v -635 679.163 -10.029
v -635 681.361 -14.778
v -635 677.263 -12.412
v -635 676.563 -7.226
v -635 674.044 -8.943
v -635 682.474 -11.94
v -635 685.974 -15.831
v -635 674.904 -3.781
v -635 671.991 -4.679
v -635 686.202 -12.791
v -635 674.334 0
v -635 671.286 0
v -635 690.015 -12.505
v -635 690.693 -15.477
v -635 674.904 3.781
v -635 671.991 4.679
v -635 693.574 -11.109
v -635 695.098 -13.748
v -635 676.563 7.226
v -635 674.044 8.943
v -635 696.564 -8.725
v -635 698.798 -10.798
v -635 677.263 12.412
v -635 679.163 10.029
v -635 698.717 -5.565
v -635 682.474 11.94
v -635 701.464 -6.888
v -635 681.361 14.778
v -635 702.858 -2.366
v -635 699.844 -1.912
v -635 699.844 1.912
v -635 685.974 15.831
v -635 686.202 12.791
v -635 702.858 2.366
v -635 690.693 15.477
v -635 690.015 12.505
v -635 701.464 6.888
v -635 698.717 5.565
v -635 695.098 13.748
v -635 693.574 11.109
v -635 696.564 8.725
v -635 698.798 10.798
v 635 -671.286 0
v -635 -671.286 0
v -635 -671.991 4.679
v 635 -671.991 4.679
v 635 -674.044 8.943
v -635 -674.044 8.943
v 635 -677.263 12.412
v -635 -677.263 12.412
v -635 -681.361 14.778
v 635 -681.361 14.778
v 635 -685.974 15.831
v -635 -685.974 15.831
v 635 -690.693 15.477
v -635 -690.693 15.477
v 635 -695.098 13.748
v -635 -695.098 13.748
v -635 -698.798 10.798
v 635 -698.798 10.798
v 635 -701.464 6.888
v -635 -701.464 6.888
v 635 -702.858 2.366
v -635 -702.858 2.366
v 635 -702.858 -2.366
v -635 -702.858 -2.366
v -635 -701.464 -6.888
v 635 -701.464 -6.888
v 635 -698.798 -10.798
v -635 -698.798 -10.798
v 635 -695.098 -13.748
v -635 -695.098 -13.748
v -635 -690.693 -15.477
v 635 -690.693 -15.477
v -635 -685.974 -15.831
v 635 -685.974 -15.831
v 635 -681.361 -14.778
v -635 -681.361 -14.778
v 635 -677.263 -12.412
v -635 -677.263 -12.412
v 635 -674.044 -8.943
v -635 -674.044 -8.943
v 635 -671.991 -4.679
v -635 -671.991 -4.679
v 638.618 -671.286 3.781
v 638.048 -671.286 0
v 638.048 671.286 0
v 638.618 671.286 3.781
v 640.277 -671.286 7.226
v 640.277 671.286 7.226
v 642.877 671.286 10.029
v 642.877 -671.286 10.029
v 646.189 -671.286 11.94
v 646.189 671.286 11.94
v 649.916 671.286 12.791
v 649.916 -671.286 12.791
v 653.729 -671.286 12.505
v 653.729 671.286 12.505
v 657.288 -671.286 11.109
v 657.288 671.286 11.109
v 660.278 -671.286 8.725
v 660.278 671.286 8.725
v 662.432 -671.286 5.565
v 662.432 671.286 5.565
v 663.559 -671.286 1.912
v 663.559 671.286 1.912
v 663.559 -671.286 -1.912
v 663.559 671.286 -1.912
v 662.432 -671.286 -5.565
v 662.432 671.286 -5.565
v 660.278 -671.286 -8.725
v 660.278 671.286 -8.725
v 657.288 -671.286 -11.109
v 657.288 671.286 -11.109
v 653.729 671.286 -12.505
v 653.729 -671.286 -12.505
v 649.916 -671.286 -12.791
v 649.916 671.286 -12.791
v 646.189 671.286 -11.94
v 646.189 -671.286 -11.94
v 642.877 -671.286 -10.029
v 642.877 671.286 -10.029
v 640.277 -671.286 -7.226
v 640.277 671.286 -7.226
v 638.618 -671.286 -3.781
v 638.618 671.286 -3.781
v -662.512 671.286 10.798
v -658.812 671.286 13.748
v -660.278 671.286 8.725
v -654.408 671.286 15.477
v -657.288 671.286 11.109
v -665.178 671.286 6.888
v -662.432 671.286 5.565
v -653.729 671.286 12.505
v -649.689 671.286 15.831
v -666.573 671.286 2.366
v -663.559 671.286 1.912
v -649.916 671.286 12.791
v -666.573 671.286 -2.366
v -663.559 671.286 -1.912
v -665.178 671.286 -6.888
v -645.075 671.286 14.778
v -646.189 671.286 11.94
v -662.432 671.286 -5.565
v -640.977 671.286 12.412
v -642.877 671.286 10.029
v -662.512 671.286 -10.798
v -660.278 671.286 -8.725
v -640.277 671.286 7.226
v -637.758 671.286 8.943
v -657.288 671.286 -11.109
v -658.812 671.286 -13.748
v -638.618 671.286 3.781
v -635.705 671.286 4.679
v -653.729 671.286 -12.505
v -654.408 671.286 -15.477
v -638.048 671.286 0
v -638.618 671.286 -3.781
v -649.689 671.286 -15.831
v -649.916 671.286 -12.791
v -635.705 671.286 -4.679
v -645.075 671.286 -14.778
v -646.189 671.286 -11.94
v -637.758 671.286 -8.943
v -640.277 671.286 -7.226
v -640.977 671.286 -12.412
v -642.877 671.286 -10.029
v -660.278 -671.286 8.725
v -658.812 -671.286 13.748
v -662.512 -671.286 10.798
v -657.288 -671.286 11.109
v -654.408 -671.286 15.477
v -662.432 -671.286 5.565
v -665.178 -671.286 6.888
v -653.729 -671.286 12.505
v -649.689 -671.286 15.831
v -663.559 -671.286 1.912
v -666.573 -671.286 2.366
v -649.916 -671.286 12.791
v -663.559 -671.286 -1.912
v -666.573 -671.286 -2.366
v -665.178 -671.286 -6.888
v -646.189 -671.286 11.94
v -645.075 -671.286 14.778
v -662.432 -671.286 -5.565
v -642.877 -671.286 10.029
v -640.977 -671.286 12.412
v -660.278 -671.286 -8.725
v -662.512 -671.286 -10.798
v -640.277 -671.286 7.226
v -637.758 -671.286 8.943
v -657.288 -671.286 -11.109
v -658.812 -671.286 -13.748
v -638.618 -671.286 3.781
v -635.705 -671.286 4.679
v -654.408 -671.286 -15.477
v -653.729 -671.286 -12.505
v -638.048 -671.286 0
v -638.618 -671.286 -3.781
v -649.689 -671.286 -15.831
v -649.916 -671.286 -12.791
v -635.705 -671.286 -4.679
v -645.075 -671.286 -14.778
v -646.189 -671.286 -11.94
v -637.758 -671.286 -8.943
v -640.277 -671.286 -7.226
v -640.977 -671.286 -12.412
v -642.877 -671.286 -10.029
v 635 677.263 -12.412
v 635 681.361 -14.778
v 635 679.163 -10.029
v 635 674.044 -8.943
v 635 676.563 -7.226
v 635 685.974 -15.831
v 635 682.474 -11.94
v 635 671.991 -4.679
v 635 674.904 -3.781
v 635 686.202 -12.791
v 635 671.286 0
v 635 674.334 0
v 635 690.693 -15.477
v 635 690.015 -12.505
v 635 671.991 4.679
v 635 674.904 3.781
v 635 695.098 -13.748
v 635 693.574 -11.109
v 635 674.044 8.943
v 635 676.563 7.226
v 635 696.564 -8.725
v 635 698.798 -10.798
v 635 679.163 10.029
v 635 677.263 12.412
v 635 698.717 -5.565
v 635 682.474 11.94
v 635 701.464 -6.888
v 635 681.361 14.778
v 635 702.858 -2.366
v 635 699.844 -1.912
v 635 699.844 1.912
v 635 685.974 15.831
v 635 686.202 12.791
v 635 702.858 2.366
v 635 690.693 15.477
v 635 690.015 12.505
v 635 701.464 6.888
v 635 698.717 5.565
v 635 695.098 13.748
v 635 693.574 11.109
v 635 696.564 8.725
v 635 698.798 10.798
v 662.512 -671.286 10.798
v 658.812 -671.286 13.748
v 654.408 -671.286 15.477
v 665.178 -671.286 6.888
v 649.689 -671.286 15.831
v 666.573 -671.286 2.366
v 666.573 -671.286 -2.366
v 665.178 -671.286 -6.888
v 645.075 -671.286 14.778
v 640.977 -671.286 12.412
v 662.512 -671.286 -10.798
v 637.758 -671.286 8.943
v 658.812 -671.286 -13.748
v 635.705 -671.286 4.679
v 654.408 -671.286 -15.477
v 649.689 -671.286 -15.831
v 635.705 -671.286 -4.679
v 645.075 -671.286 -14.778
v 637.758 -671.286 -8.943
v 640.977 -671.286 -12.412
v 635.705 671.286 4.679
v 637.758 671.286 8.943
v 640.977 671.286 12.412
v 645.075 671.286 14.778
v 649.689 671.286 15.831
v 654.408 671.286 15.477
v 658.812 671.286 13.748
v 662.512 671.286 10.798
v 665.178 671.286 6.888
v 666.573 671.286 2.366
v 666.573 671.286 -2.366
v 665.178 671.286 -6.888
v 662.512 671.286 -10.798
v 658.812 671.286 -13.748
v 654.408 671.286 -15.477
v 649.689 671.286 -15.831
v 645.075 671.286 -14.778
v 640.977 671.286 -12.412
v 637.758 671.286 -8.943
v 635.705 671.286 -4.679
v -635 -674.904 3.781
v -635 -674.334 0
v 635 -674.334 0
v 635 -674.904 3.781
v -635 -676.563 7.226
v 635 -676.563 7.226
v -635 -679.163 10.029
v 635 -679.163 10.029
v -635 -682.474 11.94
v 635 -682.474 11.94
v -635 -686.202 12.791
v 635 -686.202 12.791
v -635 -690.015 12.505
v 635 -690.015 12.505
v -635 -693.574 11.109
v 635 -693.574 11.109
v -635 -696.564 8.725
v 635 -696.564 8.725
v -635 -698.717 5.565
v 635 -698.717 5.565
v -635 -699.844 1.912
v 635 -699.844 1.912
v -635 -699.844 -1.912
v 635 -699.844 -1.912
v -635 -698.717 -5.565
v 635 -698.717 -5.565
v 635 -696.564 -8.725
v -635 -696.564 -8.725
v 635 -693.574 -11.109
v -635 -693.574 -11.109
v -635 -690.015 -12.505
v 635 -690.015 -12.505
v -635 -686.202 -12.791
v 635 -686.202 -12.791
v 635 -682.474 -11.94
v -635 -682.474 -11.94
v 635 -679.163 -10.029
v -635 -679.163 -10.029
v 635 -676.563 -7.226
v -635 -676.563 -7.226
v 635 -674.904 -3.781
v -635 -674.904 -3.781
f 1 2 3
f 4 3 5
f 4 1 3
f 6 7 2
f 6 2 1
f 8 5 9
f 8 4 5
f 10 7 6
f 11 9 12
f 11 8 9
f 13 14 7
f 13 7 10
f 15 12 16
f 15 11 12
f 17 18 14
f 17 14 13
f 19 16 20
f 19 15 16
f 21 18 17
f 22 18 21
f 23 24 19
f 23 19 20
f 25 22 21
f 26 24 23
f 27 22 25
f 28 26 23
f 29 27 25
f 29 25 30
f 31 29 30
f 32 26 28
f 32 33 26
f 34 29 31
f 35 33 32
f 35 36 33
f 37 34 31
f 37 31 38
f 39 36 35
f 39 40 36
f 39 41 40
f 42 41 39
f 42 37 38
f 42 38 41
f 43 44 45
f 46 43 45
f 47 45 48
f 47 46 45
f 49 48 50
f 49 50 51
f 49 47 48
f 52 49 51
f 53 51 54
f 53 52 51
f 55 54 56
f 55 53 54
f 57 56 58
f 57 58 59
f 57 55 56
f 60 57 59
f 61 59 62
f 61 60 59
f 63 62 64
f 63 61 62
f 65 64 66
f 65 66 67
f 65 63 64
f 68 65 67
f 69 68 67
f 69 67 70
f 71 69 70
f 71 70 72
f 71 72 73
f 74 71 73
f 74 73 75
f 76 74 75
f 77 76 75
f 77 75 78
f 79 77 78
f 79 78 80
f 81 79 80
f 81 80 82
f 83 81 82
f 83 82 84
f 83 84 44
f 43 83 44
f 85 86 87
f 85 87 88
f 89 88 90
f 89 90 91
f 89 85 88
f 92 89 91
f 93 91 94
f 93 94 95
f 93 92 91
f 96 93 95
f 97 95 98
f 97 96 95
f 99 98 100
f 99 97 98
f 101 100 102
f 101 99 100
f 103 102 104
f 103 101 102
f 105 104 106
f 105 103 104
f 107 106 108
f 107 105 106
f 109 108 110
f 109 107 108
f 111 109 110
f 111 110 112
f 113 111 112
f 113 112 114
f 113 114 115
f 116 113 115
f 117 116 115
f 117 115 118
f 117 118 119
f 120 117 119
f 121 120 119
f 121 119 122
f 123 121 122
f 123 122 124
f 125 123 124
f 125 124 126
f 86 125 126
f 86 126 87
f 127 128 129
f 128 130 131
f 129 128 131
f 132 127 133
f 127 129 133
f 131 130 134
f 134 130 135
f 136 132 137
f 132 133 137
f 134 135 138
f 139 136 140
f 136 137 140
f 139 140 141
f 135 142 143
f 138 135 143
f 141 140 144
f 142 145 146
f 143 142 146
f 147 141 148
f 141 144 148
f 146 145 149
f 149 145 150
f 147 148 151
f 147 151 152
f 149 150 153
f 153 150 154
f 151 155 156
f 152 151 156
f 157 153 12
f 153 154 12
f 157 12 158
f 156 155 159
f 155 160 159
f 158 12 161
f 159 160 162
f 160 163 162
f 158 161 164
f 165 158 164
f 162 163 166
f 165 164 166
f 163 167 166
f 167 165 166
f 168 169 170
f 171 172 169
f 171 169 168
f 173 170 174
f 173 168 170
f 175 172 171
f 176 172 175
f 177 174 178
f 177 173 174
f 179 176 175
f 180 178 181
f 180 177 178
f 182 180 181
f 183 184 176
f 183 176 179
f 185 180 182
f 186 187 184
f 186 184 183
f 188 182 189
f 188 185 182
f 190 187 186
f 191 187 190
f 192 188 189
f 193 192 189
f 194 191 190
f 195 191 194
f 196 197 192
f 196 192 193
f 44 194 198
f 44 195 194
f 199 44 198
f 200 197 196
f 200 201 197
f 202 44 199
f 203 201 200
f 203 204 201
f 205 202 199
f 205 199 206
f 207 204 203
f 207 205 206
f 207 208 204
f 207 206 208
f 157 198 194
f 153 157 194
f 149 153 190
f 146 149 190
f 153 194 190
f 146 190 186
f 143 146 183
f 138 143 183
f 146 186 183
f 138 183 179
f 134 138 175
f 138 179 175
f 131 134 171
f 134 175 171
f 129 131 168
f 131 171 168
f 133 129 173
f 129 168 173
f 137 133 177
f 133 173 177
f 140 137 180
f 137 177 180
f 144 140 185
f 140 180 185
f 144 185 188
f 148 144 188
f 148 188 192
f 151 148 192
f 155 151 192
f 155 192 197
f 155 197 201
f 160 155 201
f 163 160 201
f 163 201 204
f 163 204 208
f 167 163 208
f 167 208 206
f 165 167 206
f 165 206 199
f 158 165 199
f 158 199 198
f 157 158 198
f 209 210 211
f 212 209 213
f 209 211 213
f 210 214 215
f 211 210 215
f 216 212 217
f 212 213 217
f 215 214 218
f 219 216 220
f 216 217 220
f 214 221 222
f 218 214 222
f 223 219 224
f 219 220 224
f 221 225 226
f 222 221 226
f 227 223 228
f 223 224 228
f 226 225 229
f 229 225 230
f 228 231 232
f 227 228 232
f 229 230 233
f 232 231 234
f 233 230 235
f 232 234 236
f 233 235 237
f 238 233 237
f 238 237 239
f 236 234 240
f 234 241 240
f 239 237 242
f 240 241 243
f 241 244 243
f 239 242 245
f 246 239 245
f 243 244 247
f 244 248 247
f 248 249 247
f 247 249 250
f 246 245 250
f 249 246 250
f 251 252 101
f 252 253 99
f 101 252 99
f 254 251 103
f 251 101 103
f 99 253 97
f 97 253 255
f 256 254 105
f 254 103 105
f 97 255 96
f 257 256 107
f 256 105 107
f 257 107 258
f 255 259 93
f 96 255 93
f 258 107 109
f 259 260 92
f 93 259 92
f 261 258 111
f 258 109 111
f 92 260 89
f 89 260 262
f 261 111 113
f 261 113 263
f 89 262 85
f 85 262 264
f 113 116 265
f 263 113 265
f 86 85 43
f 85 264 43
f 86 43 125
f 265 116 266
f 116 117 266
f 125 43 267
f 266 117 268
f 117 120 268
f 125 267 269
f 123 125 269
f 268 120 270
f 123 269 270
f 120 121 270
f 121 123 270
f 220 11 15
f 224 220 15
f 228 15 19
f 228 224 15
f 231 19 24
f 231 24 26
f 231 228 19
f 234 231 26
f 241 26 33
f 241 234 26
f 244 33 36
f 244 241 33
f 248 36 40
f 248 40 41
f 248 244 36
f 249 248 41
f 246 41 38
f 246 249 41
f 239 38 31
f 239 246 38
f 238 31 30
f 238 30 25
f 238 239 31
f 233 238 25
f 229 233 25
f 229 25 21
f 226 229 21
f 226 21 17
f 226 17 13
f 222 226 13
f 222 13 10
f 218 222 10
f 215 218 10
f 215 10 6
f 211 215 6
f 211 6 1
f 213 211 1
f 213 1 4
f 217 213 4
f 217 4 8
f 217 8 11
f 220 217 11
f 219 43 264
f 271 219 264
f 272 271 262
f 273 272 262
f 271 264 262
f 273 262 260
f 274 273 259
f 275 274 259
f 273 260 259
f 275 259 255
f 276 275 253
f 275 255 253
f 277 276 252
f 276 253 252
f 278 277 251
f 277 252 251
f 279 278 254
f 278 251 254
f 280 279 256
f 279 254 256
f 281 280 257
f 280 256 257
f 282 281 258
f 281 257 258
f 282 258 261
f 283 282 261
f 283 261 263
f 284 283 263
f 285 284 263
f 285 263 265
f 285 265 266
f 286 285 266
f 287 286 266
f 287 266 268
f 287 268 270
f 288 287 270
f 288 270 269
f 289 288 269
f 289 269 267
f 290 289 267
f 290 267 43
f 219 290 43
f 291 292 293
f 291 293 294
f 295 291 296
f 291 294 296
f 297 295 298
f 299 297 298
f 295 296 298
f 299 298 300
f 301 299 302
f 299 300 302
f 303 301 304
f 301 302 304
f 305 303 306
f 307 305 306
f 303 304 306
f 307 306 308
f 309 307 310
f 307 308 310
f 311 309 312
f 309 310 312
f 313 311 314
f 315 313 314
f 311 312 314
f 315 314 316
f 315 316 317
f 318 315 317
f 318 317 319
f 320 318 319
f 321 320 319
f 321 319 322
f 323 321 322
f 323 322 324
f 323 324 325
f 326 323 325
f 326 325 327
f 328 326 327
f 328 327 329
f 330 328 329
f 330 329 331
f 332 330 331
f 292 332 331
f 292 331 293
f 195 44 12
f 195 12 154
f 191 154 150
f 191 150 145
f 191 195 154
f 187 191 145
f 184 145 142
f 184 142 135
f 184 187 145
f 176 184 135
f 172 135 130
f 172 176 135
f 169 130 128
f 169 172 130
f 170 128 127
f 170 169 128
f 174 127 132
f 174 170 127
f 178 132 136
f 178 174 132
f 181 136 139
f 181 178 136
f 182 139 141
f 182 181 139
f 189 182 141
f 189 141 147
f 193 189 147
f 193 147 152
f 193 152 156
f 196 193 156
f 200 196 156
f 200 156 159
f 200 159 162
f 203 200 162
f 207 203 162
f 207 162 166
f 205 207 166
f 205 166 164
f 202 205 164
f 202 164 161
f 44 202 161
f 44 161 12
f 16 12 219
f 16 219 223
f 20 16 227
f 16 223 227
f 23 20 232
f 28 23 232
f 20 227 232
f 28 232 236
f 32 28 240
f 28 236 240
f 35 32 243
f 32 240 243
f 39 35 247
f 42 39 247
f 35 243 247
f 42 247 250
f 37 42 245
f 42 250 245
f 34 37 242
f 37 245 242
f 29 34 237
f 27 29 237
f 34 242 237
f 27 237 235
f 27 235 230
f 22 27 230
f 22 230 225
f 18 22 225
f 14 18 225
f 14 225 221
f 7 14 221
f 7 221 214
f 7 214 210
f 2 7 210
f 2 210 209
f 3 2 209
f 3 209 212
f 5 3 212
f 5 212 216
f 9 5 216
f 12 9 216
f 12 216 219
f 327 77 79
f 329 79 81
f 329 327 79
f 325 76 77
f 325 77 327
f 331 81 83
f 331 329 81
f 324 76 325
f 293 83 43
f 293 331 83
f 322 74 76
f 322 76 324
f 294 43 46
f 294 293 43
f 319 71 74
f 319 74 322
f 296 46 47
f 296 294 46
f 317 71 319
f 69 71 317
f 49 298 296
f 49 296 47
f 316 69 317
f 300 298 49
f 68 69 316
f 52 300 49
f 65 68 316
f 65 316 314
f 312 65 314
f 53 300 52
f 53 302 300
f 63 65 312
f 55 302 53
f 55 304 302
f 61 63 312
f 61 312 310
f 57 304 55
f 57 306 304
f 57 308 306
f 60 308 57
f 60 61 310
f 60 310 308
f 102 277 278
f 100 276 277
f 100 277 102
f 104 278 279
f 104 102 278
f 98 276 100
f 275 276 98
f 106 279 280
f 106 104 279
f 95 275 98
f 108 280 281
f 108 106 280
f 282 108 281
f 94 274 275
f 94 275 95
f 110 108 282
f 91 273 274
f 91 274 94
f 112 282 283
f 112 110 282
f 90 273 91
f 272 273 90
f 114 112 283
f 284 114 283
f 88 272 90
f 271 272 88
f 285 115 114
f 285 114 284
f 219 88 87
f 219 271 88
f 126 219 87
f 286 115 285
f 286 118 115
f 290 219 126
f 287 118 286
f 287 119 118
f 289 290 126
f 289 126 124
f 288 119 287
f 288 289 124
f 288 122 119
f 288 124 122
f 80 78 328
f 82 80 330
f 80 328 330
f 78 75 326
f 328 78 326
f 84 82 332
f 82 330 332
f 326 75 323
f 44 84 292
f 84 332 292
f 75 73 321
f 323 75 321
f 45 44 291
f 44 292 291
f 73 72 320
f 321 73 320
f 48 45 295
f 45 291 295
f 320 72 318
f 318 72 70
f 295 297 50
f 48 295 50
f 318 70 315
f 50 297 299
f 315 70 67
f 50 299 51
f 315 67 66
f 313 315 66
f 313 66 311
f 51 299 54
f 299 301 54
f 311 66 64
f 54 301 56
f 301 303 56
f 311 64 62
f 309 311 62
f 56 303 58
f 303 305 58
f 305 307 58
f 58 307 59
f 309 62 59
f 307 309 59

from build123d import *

# Parameters (mm, degrees)
F2_R   = 15.875
F2_R_2 = 12.827
F6_R   = 15.875
F6_R_2 = 12.827


with BuildPart() as f3:
    # F3: sweep along a path in F0
    with BuildLine(Plane.XY) as f3_path:
        Line((-635, 671.2856875498), (-635, -671.2856875498))
    # F2 (on plane+point) → F3 (sweep)
    with BuildSketch(Plane.XZ.offset(671.2856875498)):
        with Locations((-650.875, 0)):
            Circle(F2_R)
        with Locations((-650.875, 0)):
            Circle(F2_R_2, mode=Mode.SUBTRACT)
    sweep(path=f3_path.line)


with BuildPart() as f4_1:
    # F4: instance of F3
    add(f3.part.mirror(Plane.YZ))


with BuildPart() as f7:
    # F7: sweep along a path in F0
    with BuildLine(Plane.XY) as f7_path:
        Line((-635, -671.2856875498), (635, -671.2856875498))
    # F6 (on plane+point) → F7 (sweep)
    with BuildSketch(Plane.YZ.offset(-635)):
        with Locations((-687.1606875498, 0)):
            Circle(F6_R)
        with Locations((-687.1606875498, 0)):
            Circle(F6_R_2, mode=Mode.SUBTRACT)
    sweep(path=f7_path.line)


with BuildPart() as f8_1:
    # F8: instance of F7
    add(f7.part.mirror(Plane.XZ))


solid = Compound([f3.part, f4_1.part, f7.part, f8_1.part])
